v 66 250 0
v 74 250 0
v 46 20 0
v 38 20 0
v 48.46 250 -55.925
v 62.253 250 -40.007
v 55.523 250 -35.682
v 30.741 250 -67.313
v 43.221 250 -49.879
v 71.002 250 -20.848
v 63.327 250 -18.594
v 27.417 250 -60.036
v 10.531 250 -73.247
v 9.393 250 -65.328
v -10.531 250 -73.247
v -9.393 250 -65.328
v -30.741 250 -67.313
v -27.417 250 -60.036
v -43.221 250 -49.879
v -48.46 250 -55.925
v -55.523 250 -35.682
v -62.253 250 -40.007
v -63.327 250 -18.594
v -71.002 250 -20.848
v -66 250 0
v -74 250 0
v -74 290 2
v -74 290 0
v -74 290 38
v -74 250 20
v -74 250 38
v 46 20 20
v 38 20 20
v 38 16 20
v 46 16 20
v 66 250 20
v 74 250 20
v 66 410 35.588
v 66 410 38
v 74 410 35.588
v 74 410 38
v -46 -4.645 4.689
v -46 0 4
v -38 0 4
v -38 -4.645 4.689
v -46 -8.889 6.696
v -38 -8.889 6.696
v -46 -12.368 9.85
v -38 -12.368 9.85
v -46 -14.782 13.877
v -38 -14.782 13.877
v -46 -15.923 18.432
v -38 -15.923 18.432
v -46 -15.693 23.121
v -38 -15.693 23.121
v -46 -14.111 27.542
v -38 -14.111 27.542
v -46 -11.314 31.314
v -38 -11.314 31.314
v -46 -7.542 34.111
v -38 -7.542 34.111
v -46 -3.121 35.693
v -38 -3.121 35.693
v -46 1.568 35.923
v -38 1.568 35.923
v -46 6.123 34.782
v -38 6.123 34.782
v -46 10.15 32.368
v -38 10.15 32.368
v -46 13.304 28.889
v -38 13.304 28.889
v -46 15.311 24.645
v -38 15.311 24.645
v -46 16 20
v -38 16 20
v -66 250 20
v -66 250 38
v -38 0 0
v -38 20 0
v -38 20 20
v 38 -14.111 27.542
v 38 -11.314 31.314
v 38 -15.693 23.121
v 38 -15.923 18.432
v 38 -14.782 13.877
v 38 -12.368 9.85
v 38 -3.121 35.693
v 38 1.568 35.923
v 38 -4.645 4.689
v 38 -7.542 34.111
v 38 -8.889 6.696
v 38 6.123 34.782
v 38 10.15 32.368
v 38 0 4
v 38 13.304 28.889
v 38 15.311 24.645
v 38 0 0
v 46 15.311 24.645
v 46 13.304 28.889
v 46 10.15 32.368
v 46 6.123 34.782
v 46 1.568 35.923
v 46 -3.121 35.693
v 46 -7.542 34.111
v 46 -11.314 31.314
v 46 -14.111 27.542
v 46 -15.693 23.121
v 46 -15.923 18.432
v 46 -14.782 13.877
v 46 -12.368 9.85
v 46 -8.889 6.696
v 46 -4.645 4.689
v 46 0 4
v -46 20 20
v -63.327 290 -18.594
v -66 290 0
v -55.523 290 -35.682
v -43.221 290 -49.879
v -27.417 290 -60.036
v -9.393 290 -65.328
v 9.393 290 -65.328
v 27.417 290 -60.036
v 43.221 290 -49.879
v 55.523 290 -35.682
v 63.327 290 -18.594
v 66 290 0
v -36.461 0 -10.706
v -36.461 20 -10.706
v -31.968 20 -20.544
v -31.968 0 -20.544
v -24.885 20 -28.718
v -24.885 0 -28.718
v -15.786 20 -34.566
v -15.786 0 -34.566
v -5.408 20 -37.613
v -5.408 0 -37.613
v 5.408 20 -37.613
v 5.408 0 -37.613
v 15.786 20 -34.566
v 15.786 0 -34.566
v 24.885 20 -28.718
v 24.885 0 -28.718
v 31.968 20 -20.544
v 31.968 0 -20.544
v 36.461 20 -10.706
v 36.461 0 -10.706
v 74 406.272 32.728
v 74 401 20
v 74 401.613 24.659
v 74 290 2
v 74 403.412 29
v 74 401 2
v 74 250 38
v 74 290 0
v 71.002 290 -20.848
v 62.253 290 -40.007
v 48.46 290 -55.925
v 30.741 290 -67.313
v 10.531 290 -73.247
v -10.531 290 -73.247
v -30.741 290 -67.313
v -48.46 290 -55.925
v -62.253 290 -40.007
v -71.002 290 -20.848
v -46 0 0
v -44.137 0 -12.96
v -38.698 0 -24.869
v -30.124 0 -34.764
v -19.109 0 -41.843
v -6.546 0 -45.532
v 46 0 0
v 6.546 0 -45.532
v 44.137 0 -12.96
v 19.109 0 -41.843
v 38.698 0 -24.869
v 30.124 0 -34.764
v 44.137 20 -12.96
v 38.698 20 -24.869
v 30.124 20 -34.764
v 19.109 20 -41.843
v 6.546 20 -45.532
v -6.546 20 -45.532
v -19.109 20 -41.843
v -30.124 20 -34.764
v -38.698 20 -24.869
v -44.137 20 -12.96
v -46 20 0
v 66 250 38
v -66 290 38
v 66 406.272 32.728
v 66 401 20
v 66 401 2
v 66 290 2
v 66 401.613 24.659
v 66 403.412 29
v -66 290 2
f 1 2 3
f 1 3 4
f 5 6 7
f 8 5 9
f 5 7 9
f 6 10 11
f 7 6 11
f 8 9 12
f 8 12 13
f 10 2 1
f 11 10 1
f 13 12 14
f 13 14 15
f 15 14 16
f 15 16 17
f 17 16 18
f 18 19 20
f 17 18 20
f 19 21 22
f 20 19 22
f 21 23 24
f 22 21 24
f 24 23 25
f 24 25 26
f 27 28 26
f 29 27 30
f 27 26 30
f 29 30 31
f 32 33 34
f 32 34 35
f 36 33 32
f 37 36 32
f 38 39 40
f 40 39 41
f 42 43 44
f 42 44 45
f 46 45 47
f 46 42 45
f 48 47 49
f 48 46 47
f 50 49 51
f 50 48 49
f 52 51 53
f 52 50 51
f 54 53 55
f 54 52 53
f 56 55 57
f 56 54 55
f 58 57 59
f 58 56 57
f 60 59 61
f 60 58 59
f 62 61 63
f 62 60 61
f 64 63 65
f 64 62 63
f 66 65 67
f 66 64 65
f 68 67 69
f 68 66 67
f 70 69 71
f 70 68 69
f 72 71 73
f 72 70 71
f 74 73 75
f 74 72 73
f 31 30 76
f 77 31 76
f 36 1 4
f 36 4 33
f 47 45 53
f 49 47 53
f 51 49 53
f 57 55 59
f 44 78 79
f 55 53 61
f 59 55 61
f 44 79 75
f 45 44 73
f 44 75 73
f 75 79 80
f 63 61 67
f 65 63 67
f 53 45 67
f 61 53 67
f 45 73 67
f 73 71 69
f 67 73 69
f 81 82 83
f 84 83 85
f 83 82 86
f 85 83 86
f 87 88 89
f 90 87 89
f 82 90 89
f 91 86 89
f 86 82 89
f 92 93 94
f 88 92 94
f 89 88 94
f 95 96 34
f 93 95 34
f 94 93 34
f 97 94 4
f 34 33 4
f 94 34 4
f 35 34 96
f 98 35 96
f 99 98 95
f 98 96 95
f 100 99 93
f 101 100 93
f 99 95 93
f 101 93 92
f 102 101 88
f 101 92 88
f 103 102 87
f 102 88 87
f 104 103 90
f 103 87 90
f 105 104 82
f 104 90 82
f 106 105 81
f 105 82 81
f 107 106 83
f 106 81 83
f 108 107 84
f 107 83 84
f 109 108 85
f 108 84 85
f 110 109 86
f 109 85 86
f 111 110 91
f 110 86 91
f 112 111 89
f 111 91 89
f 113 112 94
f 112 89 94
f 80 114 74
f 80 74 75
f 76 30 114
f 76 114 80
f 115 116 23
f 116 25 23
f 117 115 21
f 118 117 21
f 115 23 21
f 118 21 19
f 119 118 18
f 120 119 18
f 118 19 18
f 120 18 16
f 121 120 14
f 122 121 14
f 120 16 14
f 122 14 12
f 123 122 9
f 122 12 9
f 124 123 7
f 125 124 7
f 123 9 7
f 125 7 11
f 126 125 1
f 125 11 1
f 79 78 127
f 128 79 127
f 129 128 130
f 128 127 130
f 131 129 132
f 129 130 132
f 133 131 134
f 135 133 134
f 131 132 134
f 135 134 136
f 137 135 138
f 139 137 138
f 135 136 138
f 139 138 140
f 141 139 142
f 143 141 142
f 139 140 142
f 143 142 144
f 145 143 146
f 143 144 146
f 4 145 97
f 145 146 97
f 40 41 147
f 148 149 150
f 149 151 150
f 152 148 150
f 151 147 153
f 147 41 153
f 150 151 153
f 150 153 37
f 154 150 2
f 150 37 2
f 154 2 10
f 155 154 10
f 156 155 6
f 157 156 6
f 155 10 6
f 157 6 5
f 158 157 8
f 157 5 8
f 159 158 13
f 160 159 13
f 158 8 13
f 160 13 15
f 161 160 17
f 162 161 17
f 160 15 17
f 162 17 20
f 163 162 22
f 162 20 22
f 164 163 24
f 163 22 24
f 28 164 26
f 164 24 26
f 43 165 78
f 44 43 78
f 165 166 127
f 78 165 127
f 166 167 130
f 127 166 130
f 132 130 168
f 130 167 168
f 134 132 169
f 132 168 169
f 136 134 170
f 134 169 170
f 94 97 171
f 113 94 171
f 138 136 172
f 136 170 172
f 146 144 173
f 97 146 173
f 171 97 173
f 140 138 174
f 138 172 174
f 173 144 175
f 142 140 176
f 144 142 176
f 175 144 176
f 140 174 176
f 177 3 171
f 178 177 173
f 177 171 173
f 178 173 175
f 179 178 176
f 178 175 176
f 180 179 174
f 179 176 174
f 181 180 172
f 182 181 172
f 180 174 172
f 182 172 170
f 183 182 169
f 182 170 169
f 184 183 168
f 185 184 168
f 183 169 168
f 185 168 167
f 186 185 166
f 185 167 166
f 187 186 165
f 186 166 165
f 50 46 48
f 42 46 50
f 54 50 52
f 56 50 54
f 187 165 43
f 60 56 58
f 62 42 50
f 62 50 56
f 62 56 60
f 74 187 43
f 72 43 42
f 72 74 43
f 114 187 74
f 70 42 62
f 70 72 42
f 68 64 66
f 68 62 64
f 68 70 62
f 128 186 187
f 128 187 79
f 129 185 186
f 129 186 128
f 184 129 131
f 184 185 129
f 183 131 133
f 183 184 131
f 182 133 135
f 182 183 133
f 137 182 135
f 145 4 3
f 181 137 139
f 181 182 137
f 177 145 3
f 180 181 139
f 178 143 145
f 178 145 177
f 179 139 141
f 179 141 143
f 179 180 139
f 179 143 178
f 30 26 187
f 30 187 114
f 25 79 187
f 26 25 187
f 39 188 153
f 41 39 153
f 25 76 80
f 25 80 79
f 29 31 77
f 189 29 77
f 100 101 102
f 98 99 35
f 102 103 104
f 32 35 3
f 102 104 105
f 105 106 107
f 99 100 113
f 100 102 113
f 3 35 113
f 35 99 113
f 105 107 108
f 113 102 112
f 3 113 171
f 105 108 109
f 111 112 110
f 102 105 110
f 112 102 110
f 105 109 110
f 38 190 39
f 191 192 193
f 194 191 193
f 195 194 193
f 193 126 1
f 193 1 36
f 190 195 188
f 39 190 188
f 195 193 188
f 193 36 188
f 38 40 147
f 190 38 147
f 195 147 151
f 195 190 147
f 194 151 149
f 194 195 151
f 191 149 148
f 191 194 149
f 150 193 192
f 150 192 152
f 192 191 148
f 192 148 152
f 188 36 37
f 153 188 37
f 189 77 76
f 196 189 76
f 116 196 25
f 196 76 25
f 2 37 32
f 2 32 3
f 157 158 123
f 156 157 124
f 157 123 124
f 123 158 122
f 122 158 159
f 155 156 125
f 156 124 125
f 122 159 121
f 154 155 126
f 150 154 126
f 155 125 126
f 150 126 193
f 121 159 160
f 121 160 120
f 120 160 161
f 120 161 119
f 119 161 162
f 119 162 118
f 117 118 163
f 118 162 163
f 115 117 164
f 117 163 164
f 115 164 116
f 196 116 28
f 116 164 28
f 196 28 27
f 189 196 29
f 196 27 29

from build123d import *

# Parameters (mm, degrees)
EXTRUDE_1_DEPTH     = 20
SKETCH_3_R          = 16
EXTRUDE_2_DEPTH     = 8
EXTRUDE_START       = -8
SKETCH_4_R          = 16
EXTRUDE_3_DEPTH     = 8
EXTRUDE_4_DEPTH     = 20
SKETCH_5_W          = 8
SKETCH_5_H          = 20
SKETCH_7_W          = 8
SKETCH_7_H          = 20
SKETCH_10_W         = 8
SKETCH_10_H         = 36
EXTRUDE_5_DEPTH     = 160
CUT_EXTRUDE_3_DEPTH = 160
SKETCH_13_W         = 62.199259601
SKETCH_13_H         = 136.537597085
CUT_EXTRUDE_4_DEPTH = 10


with BuildPart() as part:
    # 草图2 → 凸台-拉伸1 (new body)
    with BuildSketch(Plane(origin=(0, 0, 0), x_dir=(1, 0, 0), z_dir=(0, 1, 0))):
        with BuildLine():
            Line((-46, 0), (-46, -20))
            Line((-46, -20), (-38, -20))
            Line((-38, -20), (-38, 0))
            ThreePointArc((-38, 0), (0, 38), (38, 0))
            Line((38, 0), (38, -20))
            Line((38, -20), (46, -20))
            Line((46, -20), (46, 0))
            ThreePointArc((46, 0), (0, 46), (-46, 0))
        make_face()
    extrude(amount=EXTRUDE_1_DEPTH)

    # 草图3 → 凸台-拉伸2 (add)
    with BuildSketch(Plane.ZY.offset(46)):
        with Locations((20, 0)):
            Circle(SKETCH_3_R)
    extrude(amount=-EXTRUDE_2_DEPTH)

    # 草图4 → 凸台-拉伸3 (add)
    with BuildSketch(Plane(origin=(46, 0, 0), x_dir=(0, 0, -1), z_dir=(1, 0, 0)).offset(EXTRUDE_START)):
        with Locations((-20, 0)):
            Circle(SKETCH_4_R)
    extrude(amount=EXTRUDE_3_DEPTH)



with BuildPart() as body_2:
    # Sketch 3D_1 → 凸台-拉伸4 (new, symmetric)
    with BuildSketch(Plane(origin=(-74, 270, 0), x_dir=(0.9909924304103234, 0, 0.13391789600139506), z_dir=(0, -1, 0))):
        with BuildLine():
            Line((0, 0), (2.67835792, 19.819848608))
            Line((2.67835792, 19.819848608), (10.606297363, 18.74850544))
            Line((10.606297363, 18.74850544), (7.927939443, -1.071343168))
            ThreePointArc((7.927939443, -1.071343168), (64.494858714, -75.315424711), (138.738940257, -18.74850544))
            Line((138.738940257, -18.74850544), (141.417298177, 1.071343168))
            Line((141.417298177, 1.071343168), (149.345237621, 0))
            Line((149.345237621, 0), (146.666879701, -19.819848608))
            ThreePointArc((146.666879701, -19.819848608), (63.423515546, -83.243364154), (0, 0))
        make_face()
    extrude(amount=EXTRUDE_4_DEPTH, both=True)


with BuildPart() as part_1:
    add(part.part)

    add(body_2.part)  # 扫描1 merges body 2
    # 扫描1: sweep along a path in 草图6
    with BuildLine(Plane.XY.offset(20)) as sweep_1_path:
        Line((46, 20), (74, 250))
    # 草图5 → 扫描1 (sweep)
    with BuildSketch(Plane(origin=(0, 20, 0), x_dir=(1, 0, 0), z_dir=(0, 1, 0))):
        with Locations((42, -10)):
            Rectangle(SKETCH_5_W, SKETCH_5_H)
    sweep(path=sweep_1_path.line)

    # 扫描2: sweep along a path in 草图8
    with BuildLine(Plane.XY.offset(20)) as sweep_2_path:
        Line((-46, 20), (-74, 250))
    # 草图7 → 扫描2 (sweep)
    with BuildSketch(Plane(origin=(0, 20, 0), x_dir=(1, 0, 0), z_dir=(0, 1, 0))):
        with Locations((-42, -10)):
            Rectangle(SKETCH_7_W, SKETCH_7_H)
    sweep(path=sweep_2_path.line)

    # 草图10 → 凸台-拉伸5 (add)
    with BuildSketch(Plane.XZ.offset(-250)):
        with Locations((-70, 20)):
            Rectangle(SKETCH_10_W, SKETCH_10_H)
        with Locations((70, 20)):
            Rectangle(SKETCH_10_W, SKETCH_10_H)
    extrude(amount=-EXTRUDE_5_DEPTH)

    # 草图12 → 切除-拉伸3 (cut)
    with BuildSketch(Plane.ZY.offset(74)):
        with BuildLine():
            Line((20, 401), (2, 401))
            Line((2, 401), (2, 419))
            ThreePointArc((2, 419), (32.727922061, 431.727922061), (20, 401))
        make_face()
    extrude(amount=-CUT_EXTRUDE_3_DEPTH, mode=Mode.SUBTRACT)

    # 草图13 → 切除-拉伸4 (cut)
    with BuildSketch(Plane.ZY.offset(74)):
        with Locations((25.303398621, 358.268798543)):
            Rectangle(SKETCH_13_W, SKETCH_13_H)
    extrude(amount=-CUT_EXTRUDE_4_DEPTH, mode=Mode.SUBTRACT)


solid = part_1.part
